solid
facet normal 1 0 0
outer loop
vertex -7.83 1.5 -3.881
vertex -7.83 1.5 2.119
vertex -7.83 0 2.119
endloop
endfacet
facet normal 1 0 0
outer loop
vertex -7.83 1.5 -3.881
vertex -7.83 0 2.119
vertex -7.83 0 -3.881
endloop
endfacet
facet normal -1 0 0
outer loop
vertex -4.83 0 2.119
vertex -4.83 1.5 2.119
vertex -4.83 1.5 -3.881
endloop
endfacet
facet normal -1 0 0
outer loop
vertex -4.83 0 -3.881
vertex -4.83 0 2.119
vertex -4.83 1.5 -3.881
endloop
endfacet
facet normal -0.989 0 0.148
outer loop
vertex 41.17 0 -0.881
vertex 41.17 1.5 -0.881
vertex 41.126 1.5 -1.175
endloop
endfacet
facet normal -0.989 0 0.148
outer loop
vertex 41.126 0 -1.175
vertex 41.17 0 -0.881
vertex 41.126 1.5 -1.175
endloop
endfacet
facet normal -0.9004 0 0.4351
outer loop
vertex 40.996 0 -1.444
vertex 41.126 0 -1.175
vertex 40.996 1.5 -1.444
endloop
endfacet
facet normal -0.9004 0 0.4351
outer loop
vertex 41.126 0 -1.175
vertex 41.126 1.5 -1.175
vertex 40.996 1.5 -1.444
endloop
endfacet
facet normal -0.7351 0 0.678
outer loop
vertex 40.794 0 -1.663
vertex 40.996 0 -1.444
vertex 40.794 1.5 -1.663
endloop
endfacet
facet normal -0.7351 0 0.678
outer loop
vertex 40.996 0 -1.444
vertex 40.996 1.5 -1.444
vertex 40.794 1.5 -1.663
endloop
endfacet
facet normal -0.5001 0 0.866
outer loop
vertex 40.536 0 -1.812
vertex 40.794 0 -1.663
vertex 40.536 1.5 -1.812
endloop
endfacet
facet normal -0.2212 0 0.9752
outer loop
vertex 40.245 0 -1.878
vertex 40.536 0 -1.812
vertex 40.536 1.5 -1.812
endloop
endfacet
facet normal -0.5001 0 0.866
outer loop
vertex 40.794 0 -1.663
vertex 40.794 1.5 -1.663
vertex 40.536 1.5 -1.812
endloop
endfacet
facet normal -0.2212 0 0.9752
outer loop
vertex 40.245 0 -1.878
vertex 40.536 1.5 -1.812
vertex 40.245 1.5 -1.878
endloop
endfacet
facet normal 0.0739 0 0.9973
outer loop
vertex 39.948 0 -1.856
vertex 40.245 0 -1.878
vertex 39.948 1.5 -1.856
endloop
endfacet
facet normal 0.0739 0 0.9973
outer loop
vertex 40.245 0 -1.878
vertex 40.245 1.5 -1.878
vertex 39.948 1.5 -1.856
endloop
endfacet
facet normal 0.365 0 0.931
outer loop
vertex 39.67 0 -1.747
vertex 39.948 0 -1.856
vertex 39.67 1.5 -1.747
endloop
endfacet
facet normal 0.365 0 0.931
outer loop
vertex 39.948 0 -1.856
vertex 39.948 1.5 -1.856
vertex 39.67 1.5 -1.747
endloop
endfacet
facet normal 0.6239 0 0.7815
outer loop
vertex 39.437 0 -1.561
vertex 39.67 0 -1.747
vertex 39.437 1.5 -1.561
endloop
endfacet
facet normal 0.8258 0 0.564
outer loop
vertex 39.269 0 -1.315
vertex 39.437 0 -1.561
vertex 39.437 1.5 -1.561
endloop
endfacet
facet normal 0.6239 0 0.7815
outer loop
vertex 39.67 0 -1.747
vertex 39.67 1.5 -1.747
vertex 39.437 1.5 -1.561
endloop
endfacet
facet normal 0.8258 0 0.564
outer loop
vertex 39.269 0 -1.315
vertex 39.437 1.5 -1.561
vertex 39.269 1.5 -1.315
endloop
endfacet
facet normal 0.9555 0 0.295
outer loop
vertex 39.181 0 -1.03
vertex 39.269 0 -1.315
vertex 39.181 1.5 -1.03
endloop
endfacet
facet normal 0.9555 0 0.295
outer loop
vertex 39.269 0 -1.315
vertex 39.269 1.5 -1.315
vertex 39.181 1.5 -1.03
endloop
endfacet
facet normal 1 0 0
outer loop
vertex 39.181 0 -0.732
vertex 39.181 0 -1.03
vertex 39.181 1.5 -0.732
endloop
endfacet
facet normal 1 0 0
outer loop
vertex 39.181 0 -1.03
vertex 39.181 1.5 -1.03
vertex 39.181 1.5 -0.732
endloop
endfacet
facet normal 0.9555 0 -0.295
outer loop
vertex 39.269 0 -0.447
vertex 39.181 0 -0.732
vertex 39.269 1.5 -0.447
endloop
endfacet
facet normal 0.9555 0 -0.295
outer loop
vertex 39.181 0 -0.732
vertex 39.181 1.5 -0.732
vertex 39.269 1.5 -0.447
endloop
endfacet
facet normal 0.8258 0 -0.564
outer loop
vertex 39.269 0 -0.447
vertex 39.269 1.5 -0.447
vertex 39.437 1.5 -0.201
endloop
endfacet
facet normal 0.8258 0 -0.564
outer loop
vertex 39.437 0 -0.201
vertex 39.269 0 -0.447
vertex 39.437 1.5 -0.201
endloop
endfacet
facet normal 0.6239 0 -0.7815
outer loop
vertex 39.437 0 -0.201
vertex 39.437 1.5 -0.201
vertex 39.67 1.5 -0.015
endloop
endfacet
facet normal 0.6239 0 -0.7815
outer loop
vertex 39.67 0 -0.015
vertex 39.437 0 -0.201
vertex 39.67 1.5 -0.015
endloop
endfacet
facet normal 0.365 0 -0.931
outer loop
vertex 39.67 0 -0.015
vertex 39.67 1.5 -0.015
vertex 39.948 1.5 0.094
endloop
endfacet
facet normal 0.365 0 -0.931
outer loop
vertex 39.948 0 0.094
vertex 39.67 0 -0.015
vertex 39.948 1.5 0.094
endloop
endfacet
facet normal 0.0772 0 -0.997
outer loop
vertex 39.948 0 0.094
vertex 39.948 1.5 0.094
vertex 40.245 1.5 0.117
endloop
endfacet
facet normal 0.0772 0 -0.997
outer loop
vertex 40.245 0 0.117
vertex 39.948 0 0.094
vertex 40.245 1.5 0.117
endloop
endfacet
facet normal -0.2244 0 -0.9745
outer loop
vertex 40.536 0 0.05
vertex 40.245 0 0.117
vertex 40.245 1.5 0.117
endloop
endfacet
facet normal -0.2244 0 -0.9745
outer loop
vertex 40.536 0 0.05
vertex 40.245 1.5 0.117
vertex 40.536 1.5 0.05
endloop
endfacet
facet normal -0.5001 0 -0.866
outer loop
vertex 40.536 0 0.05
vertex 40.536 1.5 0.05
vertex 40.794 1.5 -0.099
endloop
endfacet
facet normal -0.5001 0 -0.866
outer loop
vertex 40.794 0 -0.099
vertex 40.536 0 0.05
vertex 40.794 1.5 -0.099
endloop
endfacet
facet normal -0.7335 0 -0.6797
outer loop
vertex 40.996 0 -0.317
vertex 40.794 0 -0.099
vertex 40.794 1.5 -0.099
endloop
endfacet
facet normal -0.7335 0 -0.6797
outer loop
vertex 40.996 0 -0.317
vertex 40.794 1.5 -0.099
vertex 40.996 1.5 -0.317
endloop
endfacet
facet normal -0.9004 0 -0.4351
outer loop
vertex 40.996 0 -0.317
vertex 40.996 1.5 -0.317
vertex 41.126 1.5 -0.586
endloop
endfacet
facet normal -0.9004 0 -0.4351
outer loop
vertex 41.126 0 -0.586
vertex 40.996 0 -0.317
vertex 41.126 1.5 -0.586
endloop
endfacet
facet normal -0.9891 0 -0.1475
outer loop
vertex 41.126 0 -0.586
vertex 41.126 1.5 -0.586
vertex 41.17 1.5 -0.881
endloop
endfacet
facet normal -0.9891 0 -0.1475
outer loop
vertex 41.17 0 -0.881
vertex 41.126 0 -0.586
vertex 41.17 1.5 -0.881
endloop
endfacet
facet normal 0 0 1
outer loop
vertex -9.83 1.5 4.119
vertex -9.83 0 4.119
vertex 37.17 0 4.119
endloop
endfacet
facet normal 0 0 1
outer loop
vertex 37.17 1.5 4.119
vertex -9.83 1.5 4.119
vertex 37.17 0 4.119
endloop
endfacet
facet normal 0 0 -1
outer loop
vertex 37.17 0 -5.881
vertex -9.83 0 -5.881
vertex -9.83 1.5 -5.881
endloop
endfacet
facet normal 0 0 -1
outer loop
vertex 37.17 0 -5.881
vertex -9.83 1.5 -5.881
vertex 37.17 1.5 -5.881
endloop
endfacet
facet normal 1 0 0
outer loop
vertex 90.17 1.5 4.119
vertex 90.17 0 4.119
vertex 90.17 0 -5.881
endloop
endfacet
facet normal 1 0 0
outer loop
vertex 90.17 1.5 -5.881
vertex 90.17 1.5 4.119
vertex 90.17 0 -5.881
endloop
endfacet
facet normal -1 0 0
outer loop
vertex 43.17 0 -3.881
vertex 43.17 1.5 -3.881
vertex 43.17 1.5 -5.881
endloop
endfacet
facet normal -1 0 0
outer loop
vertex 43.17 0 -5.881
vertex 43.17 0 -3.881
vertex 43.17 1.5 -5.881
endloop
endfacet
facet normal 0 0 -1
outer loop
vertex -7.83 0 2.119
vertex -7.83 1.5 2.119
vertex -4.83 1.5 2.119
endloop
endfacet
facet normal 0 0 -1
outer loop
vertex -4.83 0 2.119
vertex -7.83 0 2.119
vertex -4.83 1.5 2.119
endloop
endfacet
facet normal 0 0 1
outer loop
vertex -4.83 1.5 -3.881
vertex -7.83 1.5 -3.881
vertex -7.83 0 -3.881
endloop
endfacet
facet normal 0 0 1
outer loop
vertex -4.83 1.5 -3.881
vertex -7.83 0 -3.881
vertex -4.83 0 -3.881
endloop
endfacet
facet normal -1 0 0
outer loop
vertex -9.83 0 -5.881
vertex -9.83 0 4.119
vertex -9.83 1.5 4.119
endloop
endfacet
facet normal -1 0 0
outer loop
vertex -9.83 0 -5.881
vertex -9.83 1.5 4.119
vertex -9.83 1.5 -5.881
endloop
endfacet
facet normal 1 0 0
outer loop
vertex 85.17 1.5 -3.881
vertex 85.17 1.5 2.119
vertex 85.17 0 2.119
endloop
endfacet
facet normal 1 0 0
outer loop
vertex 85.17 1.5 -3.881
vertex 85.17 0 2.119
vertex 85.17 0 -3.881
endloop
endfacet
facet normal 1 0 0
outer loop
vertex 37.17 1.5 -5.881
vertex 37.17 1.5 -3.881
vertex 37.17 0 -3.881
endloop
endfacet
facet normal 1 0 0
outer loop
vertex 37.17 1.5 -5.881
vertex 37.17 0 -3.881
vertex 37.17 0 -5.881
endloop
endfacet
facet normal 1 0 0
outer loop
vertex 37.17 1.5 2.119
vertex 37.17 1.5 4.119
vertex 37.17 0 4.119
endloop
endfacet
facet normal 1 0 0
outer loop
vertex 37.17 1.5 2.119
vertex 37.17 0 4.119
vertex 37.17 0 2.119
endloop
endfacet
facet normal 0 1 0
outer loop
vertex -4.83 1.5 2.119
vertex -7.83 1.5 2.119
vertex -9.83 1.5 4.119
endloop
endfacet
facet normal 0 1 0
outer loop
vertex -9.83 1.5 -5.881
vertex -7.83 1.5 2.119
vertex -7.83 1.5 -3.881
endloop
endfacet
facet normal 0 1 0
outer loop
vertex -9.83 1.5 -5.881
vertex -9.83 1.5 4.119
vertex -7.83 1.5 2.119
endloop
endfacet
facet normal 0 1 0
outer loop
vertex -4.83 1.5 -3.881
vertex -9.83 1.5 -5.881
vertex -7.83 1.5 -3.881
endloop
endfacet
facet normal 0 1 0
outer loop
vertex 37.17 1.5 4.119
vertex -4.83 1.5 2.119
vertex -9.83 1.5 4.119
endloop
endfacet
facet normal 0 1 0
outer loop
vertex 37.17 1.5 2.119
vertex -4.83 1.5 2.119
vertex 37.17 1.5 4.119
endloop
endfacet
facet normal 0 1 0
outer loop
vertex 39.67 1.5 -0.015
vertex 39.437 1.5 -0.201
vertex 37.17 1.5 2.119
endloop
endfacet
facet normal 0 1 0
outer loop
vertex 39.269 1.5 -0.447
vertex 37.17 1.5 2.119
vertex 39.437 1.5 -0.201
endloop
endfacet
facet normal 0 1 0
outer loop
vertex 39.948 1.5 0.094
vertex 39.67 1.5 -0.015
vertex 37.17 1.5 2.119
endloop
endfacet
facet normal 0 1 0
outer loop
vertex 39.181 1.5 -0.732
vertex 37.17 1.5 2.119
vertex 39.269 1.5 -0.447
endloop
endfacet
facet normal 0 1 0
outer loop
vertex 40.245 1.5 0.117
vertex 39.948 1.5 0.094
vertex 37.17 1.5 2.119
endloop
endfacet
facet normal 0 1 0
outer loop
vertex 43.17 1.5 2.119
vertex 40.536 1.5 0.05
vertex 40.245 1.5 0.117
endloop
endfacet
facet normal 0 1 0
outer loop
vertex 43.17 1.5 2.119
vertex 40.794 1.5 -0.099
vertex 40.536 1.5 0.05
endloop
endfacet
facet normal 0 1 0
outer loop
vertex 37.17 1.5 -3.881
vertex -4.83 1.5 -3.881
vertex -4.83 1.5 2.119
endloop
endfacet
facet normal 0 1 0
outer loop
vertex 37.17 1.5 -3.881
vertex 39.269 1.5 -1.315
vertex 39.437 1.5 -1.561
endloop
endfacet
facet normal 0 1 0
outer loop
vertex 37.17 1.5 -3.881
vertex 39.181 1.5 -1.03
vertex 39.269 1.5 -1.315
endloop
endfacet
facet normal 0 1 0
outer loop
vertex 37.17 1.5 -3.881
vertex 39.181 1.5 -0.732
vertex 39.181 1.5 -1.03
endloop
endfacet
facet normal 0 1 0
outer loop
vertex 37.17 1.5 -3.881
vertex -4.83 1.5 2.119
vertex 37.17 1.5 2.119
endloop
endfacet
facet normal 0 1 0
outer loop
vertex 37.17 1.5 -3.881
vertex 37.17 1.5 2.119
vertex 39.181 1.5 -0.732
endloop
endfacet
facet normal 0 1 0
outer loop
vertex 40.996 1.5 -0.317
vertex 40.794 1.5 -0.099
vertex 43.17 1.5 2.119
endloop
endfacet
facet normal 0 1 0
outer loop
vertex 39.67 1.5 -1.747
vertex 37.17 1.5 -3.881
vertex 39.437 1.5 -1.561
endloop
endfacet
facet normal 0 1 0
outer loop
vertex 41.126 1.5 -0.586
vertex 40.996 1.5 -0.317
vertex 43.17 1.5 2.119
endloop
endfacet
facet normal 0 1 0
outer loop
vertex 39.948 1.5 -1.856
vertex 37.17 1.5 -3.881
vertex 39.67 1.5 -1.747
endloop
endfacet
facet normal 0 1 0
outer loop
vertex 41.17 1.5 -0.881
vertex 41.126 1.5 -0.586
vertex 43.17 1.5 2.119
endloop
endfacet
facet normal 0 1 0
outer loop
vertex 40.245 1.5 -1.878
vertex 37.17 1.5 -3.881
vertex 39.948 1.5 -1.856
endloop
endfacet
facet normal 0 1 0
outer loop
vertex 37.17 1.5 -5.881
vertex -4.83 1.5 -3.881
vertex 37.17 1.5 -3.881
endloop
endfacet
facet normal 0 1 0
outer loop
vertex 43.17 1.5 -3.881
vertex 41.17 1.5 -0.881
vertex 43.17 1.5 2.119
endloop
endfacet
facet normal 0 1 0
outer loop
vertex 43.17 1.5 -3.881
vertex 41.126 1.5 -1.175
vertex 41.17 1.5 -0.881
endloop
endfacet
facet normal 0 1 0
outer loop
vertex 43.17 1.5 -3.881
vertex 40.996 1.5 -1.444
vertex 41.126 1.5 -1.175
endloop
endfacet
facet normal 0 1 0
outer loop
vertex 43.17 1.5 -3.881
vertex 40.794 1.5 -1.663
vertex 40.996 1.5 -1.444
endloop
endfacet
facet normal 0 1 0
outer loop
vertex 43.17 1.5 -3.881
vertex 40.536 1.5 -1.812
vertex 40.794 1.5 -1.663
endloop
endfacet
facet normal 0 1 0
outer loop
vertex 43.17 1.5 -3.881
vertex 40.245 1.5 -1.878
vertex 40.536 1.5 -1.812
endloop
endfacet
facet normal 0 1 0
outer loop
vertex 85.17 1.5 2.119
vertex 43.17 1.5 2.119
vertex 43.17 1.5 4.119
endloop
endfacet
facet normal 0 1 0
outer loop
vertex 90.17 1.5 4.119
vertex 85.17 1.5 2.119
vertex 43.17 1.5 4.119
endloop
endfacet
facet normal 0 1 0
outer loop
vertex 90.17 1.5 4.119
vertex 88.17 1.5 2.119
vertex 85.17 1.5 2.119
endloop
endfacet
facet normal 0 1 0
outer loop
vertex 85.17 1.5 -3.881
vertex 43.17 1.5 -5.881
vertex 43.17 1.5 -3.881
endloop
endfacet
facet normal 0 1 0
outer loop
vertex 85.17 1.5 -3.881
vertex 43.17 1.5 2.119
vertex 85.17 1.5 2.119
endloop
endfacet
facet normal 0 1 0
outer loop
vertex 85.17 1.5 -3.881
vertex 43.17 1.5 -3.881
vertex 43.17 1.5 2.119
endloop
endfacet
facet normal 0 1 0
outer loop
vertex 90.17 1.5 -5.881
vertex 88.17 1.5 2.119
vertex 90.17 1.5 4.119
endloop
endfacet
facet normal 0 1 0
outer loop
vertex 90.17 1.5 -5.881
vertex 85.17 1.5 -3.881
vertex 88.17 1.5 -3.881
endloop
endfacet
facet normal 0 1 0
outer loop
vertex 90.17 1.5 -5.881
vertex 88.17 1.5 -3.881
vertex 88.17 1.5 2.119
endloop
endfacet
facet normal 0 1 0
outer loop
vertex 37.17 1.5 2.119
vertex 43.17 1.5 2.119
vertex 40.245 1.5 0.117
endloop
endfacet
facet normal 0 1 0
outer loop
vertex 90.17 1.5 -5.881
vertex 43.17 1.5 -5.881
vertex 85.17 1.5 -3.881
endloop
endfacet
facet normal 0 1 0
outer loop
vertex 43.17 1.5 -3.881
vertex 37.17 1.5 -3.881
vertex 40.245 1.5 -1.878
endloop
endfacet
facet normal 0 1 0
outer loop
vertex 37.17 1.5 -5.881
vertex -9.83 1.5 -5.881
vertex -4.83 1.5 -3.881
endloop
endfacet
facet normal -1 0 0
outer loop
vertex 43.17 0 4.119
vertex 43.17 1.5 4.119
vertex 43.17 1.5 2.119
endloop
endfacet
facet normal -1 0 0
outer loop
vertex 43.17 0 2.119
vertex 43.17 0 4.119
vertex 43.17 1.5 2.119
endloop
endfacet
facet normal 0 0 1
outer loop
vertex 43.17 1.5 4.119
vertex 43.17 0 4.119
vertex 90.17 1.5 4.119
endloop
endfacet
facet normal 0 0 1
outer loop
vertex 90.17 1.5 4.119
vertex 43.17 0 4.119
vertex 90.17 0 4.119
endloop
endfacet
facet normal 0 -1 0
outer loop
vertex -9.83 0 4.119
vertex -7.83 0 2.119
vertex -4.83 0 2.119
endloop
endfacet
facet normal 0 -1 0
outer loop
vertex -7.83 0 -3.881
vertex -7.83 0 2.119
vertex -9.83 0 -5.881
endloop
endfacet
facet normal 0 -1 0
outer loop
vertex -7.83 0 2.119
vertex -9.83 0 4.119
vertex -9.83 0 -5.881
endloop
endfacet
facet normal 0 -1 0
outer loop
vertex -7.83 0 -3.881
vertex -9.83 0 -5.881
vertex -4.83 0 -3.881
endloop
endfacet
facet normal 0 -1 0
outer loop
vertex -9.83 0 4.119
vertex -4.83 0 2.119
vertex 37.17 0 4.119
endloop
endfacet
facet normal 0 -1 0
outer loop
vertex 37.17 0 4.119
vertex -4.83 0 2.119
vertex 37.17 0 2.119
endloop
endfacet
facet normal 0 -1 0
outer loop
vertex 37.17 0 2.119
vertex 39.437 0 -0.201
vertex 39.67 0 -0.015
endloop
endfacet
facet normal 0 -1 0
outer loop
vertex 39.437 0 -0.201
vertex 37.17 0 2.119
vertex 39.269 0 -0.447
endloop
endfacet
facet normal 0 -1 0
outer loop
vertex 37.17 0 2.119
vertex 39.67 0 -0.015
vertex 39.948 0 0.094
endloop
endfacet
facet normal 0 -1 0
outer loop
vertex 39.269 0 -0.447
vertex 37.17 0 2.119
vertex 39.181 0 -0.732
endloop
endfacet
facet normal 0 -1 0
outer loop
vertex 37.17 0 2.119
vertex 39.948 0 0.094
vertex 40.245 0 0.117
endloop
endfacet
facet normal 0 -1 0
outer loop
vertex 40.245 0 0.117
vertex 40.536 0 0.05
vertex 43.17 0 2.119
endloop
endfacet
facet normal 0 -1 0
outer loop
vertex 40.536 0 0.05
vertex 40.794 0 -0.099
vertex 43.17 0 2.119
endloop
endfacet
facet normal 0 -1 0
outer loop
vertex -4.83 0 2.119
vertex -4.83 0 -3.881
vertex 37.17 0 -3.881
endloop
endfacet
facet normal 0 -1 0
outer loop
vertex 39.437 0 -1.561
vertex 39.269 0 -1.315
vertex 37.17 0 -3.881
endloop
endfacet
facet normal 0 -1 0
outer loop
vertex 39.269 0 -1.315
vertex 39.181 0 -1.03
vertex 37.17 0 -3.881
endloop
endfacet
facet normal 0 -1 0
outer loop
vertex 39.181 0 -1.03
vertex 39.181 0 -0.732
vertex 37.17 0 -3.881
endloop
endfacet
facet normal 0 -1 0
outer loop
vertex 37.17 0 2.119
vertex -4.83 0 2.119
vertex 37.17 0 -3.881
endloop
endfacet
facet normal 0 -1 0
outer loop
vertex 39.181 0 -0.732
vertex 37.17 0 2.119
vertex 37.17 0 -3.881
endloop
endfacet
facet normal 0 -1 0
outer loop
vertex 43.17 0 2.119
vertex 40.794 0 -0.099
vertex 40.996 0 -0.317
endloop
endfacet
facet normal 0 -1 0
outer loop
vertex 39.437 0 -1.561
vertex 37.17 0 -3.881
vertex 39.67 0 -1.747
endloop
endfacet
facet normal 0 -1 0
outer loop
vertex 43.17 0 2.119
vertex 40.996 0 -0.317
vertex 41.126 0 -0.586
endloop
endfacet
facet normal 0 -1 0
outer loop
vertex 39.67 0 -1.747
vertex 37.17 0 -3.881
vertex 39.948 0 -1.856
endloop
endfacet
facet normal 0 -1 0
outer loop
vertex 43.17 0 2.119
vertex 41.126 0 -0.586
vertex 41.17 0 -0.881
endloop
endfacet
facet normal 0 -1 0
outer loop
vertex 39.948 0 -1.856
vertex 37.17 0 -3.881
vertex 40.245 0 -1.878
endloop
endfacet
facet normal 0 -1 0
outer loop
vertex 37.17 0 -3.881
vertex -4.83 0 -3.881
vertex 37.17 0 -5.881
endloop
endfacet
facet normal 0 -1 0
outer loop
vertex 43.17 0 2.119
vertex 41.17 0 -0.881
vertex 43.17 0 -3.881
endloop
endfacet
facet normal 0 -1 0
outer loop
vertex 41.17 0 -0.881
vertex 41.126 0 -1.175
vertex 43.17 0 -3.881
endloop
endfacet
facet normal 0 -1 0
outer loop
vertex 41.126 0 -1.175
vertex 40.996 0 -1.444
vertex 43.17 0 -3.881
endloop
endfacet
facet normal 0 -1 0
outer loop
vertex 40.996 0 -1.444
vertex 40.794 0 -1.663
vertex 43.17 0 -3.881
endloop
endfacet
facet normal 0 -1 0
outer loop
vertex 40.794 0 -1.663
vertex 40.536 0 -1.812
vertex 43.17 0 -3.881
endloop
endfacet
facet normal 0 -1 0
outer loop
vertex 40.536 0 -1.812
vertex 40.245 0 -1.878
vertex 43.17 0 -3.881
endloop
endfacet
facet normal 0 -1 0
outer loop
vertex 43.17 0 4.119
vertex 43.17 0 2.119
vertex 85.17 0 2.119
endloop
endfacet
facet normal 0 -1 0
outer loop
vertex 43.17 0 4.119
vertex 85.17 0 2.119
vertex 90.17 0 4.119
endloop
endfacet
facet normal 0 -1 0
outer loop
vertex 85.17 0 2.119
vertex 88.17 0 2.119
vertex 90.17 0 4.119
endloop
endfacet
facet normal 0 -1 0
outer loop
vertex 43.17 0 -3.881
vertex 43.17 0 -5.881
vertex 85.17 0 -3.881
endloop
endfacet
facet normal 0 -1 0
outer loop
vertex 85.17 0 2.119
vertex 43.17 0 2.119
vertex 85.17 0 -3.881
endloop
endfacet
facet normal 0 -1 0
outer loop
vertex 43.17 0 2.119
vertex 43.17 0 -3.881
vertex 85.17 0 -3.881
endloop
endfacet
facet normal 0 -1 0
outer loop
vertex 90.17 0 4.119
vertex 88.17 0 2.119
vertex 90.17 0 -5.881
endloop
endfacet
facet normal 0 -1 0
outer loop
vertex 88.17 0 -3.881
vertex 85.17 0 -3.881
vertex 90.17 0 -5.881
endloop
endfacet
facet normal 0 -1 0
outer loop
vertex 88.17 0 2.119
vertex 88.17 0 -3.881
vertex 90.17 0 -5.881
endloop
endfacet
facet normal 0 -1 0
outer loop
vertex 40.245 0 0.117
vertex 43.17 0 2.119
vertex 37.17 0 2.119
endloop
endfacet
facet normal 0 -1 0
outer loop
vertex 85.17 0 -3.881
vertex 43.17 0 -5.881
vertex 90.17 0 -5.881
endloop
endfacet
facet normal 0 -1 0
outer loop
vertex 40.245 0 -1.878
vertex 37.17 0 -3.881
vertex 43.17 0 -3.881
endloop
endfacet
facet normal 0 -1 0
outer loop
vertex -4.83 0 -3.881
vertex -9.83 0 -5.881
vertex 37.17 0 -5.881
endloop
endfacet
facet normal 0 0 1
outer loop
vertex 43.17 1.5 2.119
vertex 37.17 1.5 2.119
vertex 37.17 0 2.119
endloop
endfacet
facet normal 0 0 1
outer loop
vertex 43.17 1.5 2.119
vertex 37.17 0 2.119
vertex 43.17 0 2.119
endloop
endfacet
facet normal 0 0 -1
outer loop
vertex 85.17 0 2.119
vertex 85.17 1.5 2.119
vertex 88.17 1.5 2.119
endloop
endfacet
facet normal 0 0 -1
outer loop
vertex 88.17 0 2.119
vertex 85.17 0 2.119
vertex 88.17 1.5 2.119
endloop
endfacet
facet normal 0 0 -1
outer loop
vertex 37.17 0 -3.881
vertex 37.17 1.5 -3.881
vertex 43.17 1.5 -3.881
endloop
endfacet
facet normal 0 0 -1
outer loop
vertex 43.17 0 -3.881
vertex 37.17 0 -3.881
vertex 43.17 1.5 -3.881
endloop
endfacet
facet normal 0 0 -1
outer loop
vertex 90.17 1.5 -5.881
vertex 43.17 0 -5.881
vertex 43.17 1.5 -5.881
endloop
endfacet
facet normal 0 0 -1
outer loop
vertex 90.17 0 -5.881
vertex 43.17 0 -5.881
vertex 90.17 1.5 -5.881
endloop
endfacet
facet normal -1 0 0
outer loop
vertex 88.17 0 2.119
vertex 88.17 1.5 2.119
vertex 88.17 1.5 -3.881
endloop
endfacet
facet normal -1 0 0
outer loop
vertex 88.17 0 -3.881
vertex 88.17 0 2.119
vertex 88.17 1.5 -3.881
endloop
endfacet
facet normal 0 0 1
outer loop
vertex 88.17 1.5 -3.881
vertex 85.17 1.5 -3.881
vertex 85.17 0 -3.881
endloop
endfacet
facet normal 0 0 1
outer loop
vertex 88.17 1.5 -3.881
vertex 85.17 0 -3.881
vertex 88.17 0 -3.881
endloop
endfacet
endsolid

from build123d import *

# Parameters (mm, degrees)
SKETCH1_W           = 100
SKETCH1_H           = 10
BOSS_EXTRUDE1_DEPTH = 1.5
SKETCH2_R           = 1
CUT_EXTRUDE2_DEPTH  = 2
SKETCH5_W           = 6
SKETCH5_H           = 2
SKETCH5_W_2         = 3
SKETCH5_H_2         = 6
CUT_EXTRUDE4_DEPTH  = 2


with BuildPart() as part:
    # Sketch1 → Boss-Extrude1 (new body)
    with BuildSketch(Plane(origin=(0, 0, 0), x_dir=(1, 0, 0), z_dir=(0, 1, 0))):
        with Locations((40.170187286, 0.880693734)):
            Rectangle(SKETCH1_W, SKETCH1_H)
    extrude(amount=BOSS_EXTRUDE1_DEPTH)

    # Sketch2 → Cut-Extrude2 (cut)
    with BuildSketch(Plane(origin=(0, 1.5, 0), x_dir=(1, 0, 0), z_dir=(0, 1, 0))):
        with Locations((40.170187286, 0.880693734)):
            Circle(SKETCH2_R)
    extrude(amount=-CUT_EXTRUDE2_DEPTH, mode=Mode.SUBTRACT)

    # Sketch5 → Cut-Extrude4 (cut)
    with BuildSketch(Plane(origin=(0, 1.5, 0), x_dir=(1, 0, 0), z_dir=(0, 1, 0))):
        with Locations((40.170187286, 4.880693734)):
            Rectangle(SKETCH5_W, SKETCH5_H)
        with Locations((40.170187286, -3.119306266)):
            Rectangle(SKETCH5_W, SKETCH5_H)
        with Locations((-6.329812714, 0.880693734)):
            Rectangle(SKETCH5_W_2, SKETCH5_H_2)
        with Locations((86.670187286, 0.880693734)):
            Rectangle(SKETCH5_W_2, SKETCH5_H_2)
    extrude(amount=-CUT_EXTRUDE4_DEPTH, mode=Mode.SUBTRACT)


solid = part.part
